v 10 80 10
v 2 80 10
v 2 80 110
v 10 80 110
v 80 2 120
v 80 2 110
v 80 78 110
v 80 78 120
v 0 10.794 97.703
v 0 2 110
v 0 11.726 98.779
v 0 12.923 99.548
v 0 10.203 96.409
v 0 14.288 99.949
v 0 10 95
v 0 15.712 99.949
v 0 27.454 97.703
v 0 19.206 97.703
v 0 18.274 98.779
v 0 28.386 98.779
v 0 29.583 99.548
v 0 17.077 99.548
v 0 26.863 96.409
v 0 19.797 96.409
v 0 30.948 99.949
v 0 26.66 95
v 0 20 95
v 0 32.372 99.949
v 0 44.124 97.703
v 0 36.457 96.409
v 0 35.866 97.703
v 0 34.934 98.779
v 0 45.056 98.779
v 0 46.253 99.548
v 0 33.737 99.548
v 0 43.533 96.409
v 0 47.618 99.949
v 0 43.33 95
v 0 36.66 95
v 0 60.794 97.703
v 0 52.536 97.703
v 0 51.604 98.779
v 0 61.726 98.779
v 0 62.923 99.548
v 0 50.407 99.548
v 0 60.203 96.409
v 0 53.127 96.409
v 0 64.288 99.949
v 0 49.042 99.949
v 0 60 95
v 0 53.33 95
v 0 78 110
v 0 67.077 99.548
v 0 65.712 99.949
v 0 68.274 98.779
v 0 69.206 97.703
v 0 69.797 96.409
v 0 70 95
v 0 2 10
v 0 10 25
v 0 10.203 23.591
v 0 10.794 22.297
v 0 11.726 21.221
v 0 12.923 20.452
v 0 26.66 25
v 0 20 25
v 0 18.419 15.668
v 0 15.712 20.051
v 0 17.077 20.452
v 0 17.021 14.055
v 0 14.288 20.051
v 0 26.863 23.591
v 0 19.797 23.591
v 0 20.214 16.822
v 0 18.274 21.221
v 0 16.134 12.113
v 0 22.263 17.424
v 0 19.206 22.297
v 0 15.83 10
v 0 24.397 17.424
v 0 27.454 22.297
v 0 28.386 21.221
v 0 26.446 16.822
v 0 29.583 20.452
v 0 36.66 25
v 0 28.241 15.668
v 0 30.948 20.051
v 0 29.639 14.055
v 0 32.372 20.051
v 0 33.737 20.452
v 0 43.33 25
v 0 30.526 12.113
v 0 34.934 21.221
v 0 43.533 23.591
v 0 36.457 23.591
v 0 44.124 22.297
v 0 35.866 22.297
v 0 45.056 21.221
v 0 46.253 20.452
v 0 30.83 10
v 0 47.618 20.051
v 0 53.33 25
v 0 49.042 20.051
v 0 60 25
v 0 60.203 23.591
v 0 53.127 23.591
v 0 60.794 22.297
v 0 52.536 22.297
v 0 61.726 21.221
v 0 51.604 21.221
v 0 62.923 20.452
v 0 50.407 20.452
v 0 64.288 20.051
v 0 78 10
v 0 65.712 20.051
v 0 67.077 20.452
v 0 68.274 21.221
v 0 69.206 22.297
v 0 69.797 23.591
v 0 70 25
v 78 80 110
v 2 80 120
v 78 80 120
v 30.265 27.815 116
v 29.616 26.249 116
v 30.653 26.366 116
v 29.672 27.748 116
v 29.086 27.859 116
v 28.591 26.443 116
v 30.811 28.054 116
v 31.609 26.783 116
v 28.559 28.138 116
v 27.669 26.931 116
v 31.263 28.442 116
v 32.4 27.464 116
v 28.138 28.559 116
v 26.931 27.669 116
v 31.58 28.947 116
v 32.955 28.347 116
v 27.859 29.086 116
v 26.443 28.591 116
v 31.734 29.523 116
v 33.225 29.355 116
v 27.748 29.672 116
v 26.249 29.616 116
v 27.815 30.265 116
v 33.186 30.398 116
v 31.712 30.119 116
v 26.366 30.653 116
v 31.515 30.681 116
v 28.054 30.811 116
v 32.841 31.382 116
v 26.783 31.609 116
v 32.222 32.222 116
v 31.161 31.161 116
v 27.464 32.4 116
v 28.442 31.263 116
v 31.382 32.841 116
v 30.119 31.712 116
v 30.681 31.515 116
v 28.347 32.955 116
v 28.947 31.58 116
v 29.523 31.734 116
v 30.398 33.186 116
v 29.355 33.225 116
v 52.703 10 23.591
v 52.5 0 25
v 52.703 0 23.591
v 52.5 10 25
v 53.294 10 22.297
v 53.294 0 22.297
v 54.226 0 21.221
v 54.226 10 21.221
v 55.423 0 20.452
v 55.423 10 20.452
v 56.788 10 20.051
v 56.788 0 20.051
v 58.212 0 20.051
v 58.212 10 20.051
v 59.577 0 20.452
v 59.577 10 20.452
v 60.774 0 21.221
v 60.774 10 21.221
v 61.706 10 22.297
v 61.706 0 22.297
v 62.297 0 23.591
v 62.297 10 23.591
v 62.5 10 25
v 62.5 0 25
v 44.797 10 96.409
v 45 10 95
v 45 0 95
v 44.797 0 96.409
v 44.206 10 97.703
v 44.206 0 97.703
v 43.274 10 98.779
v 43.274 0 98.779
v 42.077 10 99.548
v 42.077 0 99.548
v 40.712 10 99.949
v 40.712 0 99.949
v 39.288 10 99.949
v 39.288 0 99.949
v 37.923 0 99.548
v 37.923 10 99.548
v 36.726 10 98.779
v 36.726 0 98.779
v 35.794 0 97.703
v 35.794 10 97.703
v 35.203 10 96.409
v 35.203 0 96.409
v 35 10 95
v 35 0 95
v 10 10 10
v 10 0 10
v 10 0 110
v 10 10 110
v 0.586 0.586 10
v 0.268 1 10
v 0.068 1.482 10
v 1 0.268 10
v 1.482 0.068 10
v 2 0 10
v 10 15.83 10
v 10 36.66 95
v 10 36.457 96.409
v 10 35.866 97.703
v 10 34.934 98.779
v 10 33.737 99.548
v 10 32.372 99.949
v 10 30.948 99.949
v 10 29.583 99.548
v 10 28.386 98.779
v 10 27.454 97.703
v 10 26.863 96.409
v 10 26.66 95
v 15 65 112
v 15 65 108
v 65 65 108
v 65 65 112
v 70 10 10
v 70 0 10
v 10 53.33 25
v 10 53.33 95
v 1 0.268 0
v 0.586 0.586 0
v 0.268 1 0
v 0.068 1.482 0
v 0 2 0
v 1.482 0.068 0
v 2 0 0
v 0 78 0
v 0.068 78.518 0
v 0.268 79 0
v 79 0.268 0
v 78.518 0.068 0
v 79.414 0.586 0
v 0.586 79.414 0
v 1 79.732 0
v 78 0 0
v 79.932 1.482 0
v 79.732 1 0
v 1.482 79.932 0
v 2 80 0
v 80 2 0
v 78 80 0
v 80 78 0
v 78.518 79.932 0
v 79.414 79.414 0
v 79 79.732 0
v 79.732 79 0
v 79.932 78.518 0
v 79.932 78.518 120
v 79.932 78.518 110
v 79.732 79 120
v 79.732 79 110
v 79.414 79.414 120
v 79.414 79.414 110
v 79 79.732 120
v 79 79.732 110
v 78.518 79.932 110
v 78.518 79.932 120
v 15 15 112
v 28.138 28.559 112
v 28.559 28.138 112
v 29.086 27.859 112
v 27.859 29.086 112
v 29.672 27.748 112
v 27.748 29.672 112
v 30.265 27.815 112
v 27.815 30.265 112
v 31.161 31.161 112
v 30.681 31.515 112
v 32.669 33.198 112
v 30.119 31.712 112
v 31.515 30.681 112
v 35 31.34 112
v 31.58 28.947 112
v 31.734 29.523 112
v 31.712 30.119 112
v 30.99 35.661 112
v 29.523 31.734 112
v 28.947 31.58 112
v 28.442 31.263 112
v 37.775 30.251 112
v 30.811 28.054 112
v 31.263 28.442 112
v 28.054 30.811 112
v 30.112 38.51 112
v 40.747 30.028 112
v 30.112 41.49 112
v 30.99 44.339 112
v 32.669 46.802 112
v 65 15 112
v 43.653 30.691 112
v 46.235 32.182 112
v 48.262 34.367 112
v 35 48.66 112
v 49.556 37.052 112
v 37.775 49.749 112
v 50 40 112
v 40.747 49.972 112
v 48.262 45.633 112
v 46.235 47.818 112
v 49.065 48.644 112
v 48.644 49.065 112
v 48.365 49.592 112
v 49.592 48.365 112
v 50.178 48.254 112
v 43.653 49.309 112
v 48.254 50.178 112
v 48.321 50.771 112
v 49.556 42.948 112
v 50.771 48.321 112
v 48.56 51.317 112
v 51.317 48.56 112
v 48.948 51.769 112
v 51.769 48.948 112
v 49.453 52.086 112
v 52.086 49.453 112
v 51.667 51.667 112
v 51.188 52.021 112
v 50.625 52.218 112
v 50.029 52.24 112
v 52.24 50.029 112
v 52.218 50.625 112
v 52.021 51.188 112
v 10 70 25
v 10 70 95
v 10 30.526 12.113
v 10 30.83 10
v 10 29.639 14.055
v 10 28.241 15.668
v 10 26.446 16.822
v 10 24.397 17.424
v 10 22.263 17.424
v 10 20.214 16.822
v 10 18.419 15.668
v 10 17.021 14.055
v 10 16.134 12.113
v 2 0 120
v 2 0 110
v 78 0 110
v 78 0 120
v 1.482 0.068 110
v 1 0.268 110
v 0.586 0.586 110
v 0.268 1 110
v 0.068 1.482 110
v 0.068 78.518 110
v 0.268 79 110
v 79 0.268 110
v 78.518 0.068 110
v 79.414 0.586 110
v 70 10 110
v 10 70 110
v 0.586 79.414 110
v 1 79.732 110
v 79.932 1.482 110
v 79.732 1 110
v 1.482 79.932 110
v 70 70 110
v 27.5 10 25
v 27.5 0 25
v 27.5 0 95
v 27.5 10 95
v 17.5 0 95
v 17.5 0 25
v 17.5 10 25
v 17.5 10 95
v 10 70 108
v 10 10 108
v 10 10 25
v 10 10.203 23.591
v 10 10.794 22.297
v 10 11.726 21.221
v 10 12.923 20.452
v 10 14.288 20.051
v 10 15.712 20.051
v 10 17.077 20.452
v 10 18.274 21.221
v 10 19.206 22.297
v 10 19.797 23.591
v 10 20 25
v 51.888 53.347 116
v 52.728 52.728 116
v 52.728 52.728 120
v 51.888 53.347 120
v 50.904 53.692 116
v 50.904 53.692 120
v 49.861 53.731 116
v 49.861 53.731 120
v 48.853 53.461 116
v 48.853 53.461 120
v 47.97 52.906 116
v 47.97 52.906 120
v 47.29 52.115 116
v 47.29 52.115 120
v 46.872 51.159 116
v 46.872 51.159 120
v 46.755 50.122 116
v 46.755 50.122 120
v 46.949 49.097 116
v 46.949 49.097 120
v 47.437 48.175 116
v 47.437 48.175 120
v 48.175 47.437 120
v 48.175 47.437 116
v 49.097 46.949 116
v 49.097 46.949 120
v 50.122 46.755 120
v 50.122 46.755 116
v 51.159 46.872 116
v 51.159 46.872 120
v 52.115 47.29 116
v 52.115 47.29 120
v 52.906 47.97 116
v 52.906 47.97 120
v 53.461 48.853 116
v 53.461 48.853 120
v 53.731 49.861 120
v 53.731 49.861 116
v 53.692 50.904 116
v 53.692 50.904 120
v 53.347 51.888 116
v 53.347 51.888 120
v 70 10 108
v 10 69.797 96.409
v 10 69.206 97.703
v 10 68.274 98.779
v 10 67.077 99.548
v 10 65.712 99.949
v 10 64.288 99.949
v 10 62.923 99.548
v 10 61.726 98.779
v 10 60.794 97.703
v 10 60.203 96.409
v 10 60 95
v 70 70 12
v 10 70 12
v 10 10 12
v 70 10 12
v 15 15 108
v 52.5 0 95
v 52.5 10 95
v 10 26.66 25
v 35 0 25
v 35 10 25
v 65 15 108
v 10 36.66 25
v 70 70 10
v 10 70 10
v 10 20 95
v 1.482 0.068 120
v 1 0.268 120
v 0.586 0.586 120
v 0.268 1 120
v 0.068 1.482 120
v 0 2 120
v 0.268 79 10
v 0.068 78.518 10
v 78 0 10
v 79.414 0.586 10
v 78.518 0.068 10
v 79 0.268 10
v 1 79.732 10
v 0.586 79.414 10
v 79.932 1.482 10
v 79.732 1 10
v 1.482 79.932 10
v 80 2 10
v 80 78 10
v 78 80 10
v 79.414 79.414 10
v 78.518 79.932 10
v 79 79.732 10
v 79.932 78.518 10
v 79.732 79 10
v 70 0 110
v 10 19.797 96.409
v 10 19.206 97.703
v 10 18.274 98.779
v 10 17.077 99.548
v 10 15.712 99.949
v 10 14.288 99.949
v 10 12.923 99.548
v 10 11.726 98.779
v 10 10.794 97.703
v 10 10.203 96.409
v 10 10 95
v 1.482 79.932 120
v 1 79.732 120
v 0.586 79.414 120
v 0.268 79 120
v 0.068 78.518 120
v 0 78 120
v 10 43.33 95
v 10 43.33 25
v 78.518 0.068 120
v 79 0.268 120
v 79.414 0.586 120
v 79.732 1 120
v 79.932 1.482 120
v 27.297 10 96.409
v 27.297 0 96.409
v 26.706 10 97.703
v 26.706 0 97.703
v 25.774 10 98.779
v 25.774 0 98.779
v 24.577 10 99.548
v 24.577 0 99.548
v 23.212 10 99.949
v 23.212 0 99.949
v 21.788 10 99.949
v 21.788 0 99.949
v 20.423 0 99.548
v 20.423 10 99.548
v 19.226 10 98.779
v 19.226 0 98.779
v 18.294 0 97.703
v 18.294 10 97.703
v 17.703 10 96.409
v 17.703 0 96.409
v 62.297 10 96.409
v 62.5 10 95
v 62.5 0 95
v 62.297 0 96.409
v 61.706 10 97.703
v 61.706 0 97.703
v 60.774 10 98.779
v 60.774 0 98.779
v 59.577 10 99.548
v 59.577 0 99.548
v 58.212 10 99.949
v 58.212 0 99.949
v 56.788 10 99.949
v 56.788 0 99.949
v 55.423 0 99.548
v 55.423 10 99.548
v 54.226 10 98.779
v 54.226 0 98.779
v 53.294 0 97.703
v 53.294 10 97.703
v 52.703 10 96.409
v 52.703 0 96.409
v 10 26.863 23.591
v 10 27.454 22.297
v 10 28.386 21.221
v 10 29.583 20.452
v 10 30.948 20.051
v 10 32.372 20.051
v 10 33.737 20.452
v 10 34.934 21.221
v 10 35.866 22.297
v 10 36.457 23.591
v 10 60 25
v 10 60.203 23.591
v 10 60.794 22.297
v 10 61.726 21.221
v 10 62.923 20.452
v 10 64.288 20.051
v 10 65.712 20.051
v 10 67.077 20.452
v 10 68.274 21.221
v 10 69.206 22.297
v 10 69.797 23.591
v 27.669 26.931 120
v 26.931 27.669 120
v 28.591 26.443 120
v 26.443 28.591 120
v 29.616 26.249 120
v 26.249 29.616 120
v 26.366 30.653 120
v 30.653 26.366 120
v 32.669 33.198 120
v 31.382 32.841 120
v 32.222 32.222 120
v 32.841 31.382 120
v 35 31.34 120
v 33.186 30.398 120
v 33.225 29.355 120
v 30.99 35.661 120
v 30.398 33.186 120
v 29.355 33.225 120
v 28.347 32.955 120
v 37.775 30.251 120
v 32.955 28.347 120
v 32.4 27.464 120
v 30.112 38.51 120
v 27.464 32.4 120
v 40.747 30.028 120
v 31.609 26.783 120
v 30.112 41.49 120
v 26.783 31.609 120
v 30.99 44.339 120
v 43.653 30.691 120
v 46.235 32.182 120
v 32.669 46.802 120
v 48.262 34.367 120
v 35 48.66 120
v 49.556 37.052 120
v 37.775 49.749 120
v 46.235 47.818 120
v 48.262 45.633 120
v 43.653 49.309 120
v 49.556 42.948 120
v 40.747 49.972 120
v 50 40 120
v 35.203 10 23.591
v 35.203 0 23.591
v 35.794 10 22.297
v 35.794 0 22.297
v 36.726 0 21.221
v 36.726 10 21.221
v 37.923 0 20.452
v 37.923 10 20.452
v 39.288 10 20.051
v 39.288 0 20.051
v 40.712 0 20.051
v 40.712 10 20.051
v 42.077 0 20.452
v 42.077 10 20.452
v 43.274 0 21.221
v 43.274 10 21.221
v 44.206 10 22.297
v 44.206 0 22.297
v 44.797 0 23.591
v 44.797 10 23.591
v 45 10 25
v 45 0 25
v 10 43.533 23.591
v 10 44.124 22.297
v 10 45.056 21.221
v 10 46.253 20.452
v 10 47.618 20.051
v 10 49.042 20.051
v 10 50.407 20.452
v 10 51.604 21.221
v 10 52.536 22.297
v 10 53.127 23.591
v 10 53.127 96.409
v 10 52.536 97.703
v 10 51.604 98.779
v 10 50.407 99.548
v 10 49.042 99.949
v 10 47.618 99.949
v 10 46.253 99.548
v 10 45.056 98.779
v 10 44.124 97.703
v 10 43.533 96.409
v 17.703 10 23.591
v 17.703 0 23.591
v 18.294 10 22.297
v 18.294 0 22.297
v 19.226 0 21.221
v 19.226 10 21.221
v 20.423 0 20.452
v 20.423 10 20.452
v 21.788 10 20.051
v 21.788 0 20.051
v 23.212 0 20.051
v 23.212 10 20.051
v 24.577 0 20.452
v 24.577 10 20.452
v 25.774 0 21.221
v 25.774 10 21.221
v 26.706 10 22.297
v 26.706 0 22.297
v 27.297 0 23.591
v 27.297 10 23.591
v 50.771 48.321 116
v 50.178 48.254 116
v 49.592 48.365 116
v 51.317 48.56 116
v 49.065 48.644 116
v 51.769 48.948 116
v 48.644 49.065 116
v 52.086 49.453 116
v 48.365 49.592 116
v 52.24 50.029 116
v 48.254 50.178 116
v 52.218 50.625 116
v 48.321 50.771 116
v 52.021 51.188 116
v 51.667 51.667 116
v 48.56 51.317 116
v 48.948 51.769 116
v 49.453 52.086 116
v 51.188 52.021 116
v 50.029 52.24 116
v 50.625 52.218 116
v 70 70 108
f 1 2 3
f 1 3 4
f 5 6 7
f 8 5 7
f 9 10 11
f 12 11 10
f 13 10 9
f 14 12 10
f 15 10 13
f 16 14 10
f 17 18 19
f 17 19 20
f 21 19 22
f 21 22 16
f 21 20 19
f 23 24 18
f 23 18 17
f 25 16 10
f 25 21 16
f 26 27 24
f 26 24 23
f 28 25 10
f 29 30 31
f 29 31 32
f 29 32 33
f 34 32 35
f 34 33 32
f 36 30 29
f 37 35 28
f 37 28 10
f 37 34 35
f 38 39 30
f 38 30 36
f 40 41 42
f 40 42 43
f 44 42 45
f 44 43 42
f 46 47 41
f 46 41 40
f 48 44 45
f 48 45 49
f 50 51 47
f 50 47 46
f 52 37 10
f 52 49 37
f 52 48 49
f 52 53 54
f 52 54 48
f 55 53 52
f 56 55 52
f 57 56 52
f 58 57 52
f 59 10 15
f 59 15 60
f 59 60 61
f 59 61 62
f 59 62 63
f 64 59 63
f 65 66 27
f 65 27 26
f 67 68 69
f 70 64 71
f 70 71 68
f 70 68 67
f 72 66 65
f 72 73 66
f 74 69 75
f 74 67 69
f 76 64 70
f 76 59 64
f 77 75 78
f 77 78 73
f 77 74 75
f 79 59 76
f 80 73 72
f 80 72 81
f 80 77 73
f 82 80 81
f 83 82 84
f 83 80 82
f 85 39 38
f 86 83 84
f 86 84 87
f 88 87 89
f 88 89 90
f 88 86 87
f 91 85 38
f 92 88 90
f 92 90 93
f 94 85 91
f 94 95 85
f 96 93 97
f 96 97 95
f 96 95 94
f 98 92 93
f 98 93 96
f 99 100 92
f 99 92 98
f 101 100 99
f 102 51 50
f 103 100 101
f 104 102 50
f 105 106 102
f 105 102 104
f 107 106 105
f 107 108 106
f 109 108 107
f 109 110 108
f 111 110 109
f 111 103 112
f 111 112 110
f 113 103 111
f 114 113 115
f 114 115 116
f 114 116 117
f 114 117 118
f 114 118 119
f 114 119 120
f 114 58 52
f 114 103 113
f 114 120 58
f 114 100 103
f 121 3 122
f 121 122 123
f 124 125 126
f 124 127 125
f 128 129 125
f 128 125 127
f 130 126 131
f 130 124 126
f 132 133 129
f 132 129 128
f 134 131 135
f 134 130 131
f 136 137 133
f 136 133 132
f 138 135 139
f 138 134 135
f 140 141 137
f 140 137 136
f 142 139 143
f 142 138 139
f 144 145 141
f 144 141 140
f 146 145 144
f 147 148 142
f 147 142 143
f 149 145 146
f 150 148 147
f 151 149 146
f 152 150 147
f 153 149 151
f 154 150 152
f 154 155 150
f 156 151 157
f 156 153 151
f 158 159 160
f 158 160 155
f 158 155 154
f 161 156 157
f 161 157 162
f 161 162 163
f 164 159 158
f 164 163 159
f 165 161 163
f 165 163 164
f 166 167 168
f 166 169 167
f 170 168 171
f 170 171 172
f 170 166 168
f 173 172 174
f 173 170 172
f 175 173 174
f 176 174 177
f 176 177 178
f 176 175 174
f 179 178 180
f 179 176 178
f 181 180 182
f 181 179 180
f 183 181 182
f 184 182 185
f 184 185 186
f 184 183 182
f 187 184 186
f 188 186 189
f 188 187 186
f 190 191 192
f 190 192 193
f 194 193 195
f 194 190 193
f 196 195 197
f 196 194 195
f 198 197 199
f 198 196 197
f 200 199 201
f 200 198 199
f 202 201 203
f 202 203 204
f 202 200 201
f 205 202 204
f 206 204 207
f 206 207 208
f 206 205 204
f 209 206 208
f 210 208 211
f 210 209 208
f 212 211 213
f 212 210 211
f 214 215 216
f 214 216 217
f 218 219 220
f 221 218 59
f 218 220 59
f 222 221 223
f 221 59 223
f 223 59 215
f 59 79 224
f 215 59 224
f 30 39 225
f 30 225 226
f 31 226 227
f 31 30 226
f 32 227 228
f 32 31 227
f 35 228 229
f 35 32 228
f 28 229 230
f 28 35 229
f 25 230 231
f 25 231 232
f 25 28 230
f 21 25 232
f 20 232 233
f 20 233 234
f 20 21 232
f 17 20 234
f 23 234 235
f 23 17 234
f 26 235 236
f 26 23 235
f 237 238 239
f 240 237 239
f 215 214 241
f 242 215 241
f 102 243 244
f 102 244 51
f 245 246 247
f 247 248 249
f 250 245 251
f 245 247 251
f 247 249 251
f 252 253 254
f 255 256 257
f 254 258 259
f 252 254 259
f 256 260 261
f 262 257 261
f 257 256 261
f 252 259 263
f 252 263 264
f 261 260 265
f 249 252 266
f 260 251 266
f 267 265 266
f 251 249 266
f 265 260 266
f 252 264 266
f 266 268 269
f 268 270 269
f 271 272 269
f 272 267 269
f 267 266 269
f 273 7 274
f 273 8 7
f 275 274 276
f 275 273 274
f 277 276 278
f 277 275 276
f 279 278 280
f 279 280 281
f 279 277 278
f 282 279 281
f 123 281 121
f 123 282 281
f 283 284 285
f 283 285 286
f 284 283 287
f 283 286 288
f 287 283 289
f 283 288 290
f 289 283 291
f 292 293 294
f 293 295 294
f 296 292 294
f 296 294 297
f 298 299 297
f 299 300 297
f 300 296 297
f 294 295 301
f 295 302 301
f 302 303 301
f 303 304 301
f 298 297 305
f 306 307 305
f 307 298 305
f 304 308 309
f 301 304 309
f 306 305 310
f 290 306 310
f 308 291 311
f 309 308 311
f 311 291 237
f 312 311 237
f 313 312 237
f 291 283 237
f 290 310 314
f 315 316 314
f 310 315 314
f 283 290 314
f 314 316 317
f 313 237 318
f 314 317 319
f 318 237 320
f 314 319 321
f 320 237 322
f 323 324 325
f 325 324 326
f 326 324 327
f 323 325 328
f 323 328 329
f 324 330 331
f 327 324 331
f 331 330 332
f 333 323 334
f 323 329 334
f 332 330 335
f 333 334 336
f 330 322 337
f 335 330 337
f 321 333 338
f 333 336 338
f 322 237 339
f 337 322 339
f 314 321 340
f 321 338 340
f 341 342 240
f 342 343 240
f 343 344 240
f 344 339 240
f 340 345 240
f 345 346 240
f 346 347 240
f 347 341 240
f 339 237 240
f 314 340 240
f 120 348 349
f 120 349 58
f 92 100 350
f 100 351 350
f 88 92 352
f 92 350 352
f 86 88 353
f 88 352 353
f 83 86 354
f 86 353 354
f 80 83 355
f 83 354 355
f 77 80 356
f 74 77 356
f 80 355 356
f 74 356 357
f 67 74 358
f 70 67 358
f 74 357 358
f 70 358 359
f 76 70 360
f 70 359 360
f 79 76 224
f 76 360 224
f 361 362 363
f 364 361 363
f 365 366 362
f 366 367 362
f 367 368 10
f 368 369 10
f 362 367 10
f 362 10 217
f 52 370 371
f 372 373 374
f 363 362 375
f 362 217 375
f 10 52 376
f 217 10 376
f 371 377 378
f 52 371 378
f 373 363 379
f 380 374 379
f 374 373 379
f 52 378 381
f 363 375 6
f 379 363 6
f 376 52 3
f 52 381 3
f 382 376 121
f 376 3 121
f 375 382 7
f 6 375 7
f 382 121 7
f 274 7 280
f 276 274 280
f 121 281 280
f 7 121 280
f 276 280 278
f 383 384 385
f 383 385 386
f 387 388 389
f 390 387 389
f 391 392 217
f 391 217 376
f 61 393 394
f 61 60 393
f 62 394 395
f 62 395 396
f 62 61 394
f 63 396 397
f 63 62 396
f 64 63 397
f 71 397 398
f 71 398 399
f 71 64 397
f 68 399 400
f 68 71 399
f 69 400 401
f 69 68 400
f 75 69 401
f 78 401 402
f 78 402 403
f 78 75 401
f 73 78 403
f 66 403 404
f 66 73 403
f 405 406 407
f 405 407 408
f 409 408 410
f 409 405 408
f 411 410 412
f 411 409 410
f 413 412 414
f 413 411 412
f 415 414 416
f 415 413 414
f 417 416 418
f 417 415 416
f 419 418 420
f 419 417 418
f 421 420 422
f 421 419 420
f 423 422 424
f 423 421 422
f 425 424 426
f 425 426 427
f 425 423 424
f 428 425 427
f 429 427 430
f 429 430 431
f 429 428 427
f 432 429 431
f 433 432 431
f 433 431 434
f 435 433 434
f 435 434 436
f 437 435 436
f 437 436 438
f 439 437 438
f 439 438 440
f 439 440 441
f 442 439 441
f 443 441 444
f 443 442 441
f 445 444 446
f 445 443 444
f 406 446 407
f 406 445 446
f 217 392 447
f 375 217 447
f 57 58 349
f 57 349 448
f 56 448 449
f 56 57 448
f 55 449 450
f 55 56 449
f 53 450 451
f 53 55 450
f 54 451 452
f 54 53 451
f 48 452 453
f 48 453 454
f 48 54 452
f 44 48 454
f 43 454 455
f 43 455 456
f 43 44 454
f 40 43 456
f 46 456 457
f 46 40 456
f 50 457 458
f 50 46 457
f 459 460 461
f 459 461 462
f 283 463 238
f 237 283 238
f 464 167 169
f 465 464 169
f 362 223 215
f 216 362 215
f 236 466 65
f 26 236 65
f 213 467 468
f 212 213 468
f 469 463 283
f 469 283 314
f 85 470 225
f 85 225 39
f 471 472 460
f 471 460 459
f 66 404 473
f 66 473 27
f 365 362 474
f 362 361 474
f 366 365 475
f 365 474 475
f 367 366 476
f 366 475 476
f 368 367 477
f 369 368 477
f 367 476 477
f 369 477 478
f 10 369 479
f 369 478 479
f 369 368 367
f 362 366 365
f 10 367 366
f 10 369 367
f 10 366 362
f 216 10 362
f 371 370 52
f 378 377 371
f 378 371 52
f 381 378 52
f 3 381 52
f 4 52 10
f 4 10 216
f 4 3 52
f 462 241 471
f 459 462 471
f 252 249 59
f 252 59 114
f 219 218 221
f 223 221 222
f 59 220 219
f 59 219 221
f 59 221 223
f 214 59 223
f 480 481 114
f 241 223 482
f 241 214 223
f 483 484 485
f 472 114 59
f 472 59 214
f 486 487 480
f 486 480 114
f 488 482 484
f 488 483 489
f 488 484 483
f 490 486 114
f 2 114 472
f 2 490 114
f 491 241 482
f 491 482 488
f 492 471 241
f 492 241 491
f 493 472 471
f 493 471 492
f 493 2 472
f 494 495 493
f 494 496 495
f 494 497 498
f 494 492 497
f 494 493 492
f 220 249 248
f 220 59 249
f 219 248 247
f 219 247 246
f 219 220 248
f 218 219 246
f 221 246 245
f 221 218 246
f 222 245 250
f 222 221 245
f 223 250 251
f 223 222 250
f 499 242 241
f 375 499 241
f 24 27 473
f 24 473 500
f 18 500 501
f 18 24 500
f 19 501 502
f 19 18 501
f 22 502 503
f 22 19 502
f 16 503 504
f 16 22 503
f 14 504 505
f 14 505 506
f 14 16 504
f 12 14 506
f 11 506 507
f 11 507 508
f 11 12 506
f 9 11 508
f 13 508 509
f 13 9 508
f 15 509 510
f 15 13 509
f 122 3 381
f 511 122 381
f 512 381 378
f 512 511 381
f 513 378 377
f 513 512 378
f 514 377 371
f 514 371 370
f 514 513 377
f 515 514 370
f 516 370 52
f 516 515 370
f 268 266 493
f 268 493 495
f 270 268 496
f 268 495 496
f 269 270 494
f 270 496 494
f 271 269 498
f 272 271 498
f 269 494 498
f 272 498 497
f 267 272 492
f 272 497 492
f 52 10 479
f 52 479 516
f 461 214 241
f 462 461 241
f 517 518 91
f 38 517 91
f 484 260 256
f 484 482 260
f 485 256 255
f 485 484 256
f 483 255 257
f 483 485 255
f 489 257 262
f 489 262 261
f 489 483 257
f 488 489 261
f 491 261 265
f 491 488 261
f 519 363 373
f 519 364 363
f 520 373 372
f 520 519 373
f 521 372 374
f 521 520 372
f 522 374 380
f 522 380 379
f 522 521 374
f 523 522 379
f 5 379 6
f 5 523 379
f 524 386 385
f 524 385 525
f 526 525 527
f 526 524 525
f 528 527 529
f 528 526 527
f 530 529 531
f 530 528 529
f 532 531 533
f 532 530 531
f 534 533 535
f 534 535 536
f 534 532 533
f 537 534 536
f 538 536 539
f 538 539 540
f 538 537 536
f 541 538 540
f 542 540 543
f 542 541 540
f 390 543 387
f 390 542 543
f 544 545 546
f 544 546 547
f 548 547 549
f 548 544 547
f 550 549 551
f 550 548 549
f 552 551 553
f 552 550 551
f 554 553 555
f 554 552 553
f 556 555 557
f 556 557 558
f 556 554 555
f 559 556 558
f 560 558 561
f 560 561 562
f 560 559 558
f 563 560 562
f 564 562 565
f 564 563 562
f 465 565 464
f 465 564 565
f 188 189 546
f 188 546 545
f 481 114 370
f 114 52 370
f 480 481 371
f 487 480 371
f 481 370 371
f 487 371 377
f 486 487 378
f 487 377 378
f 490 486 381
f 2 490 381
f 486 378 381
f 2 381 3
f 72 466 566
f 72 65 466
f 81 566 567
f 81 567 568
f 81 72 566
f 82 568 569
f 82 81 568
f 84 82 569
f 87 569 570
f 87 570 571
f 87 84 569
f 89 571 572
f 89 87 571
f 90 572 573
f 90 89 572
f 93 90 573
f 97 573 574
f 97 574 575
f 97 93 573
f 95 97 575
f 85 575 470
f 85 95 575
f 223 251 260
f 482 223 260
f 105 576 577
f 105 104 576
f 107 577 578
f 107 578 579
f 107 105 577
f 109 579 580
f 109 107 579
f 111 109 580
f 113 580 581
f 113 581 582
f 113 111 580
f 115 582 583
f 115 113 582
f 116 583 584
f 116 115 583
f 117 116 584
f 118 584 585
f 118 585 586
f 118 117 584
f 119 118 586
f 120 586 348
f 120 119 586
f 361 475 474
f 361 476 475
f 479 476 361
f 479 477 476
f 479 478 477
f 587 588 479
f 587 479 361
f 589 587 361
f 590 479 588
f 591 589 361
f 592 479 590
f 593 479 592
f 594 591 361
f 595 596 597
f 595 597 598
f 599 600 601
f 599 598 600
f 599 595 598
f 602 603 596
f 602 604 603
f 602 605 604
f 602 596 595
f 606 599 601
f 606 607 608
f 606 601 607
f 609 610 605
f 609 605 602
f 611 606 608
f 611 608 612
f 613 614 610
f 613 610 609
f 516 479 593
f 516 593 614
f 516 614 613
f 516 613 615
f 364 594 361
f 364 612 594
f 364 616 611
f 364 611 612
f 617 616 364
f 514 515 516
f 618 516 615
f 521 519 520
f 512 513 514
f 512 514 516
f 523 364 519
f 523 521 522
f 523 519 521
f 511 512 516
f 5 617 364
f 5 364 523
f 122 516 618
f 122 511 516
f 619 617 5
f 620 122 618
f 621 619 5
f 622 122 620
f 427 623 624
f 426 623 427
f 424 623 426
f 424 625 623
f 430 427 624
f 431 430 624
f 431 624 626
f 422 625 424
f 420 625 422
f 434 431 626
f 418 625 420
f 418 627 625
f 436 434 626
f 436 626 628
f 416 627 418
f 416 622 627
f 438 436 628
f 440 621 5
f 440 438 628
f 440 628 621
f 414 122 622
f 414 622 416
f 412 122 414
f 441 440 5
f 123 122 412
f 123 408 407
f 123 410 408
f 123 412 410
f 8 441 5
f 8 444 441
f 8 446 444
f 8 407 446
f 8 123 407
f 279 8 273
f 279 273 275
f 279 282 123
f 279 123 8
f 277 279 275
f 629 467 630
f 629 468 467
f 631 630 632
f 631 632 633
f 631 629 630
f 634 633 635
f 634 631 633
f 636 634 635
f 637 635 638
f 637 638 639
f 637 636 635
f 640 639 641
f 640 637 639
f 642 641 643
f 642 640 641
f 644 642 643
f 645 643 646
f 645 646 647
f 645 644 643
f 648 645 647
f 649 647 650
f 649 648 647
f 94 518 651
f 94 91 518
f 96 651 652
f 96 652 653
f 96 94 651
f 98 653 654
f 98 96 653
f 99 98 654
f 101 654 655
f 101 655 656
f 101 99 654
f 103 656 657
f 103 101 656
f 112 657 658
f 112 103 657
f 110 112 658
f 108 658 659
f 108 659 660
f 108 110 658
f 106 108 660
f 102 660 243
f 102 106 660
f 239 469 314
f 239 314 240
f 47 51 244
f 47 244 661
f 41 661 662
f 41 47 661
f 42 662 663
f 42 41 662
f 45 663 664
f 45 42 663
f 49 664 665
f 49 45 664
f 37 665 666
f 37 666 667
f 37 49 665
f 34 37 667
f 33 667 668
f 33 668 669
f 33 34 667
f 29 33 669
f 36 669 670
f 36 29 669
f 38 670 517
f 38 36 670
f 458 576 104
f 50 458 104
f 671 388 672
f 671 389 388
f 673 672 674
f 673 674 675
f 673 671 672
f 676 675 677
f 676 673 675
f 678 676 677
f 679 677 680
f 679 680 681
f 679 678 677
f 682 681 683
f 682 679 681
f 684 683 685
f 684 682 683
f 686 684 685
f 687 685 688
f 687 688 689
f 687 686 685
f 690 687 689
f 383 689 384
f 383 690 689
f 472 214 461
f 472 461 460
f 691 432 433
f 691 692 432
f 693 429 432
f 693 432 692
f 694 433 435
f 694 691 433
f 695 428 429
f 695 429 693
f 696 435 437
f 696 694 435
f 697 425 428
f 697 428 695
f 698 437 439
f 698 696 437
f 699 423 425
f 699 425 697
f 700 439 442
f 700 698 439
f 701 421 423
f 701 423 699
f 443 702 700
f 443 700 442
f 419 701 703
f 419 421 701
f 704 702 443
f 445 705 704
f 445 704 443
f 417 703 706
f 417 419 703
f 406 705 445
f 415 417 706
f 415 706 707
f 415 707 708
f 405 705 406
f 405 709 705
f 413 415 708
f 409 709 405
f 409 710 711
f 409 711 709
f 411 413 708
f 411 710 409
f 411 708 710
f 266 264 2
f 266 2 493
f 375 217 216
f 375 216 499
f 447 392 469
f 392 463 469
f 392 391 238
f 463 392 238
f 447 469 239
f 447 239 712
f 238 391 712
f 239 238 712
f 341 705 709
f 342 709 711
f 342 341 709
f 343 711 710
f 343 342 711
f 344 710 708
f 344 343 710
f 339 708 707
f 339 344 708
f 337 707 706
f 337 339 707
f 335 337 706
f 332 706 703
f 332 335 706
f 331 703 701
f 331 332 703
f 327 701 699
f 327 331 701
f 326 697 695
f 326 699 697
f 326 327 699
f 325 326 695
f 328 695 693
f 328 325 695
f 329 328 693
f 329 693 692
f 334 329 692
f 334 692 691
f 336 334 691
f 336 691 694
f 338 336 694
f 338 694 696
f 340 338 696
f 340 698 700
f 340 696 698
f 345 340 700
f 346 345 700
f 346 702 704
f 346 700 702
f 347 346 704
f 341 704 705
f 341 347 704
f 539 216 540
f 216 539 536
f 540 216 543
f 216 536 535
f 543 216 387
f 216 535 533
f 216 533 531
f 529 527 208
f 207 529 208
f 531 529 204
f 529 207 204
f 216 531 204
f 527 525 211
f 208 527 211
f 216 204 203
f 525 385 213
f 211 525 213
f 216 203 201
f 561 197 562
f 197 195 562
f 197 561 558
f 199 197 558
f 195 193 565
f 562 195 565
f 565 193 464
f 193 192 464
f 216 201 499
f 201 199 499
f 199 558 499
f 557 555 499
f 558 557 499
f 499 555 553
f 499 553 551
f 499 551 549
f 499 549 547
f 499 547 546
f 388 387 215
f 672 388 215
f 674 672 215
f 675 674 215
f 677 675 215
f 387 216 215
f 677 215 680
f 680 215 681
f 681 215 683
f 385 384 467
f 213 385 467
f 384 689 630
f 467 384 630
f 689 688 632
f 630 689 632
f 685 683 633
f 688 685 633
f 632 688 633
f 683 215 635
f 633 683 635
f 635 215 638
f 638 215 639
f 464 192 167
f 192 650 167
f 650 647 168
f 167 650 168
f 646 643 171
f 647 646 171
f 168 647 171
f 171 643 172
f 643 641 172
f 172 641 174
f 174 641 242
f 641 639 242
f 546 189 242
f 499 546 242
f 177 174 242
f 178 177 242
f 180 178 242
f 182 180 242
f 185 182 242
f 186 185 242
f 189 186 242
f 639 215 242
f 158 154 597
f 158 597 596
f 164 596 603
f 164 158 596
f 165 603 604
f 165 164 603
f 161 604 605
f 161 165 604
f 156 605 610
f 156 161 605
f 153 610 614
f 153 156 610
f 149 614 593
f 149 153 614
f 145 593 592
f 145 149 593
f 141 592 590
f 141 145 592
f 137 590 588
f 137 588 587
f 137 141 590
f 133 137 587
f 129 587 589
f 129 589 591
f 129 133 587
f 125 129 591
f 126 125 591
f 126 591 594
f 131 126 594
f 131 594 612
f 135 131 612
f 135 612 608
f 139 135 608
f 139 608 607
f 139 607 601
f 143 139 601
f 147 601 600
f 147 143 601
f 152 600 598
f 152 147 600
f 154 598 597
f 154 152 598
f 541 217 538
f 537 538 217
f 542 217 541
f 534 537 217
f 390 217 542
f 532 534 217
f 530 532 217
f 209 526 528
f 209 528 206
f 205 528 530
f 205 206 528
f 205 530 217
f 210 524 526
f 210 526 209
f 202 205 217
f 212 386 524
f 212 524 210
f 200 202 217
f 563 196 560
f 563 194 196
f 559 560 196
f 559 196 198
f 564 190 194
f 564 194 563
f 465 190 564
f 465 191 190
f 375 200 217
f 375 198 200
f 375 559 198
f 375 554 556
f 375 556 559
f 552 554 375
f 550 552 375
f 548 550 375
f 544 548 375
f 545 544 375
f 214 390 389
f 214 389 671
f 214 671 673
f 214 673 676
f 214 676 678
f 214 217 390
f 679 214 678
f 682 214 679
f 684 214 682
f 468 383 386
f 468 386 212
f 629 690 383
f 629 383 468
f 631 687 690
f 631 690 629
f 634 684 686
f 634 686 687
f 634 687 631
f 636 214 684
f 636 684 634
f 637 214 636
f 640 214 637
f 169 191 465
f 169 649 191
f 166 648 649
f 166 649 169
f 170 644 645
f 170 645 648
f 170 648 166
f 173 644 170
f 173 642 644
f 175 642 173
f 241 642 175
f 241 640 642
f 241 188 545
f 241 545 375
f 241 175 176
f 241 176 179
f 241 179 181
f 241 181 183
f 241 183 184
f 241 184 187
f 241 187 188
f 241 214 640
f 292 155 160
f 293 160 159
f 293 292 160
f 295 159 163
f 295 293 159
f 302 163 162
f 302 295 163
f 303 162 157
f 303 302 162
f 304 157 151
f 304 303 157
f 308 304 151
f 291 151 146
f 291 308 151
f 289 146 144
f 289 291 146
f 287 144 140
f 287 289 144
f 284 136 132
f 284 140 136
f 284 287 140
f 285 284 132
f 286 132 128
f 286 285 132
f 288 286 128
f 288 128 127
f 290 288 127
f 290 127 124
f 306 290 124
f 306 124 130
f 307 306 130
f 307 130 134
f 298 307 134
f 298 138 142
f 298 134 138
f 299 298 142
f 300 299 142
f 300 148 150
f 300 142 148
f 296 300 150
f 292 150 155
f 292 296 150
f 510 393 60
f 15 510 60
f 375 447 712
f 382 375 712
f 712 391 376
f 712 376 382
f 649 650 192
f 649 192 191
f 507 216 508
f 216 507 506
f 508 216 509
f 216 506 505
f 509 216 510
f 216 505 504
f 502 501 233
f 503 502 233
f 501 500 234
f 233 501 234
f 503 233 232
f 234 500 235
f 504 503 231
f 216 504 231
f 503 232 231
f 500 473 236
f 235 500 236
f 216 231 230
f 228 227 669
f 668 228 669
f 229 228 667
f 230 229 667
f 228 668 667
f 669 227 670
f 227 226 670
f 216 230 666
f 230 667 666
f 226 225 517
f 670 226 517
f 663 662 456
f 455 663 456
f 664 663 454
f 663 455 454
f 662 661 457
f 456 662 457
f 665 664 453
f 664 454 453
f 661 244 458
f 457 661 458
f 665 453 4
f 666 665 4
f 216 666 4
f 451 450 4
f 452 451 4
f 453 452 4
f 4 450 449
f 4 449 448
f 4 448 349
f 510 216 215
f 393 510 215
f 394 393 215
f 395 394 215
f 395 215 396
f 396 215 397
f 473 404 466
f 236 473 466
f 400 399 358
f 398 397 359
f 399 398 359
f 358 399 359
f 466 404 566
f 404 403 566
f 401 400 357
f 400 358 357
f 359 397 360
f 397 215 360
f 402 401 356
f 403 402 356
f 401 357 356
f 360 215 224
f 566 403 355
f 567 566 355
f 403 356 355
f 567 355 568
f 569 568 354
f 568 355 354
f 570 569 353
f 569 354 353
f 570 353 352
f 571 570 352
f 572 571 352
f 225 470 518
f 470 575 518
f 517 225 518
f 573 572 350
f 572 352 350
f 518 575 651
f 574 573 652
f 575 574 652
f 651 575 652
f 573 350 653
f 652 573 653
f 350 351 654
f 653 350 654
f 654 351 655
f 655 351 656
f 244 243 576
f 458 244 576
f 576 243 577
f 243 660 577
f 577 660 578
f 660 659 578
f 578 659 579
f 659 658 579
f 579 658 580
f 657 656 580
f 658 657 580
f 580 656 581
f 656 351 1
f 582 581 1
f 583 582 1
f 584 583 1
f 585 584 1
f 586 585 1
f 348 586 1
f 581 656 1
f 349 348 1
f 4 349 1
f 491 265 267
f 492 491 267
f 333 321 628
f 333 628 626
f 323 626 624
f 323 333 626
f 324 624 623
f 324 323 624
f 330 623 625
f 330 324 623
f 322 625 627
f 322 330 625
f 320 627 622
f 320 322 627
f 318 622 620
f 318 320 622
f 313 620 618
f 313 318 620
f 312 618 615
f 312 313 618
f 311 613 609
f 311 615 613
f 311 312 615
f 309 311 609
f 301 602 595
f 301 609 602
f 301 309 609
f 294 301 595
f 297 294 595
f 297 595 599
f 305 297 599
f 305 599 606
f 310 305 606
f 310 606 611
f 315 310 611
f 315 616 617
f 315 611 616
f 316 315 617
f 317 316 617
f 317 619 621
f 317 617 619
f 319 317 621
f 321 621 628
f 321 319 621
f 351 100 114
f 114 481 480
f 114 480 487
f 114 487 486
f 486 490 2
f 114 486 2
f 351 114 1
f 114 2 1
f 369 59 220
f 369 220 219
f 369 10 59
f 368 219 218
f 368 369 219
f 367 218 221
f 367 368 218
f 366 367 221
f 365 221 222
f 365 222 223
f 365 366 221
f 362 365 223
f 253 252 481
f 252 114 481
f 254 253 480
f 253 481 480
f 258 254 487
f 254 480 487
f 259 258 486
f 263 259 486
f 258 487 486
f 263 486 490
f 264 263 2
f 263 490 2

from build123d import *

# Parameters (mm, degrees)
BOX004_W                  = 60
BOX004_H                  = 60
BOX004_DEPTH              = 2
BOX_W                     = 80
BOX_H                     = 80
BOX_DEPTH                 = 10
FILLET005_R               = 2
CYLINDER002_R             = 5
CYLINDER002_DEPTH         = 10
CYLINDER003_R             = 5
CYLINDER003_DEPTH         = 10
BOX008_W                  = 10
BOX008_H                  = 10
BOX008_DEPTH              = 70
CYLINDER004_R             = 5
CYLINDER004_DEPTH         = 10
CYLINDER005_R             = 5
CYLINDER005_DEPTH         = 10
BOX009_W                  = 10
BOX009_H                  = 10
BOX009_DEPTH              = 70
CYLINDER_R                = 5
CYLINDER_DEPTH            = 10
CYLINDER001_R             = 5
CYLINDER001_DEPTH         = 10
BOX007_W                  = 10
BOX007_H                  = 10
BOX007_DEPTH              = 70
BOX001_W                  = 60
BOX001_H                  = 10
BOX001_DEPTH              = 100
CYLINDER014_W             = 7.5
CYLINDER014_H             = 10
CYLINDER014_ANGLE         = 180
CYLINDER007_R             = 5
CYLINDER007_DEPTH         = 10
CYLINDER006_R             = 5
CYLINDER006_DEPTH         = 10
BOX010_W                  = 10
BOX010_H                  = 10
BOX010_DEPTH              = 70
FUSION003_PLACEMENT_ANGLE = 90
CYLINDER008_R             = 5
CYLINDER008_DEPTH         = 10
CYLINDER009_R             = 5
CYLINDER009_DEPTH         = 10
BOX011_W                  = 10
BOX011_H                  = 10
BOX011_DEPTH              = 70
FUSION004_PLACEMENT_ANGLE = 90
CYLINDER010_R             = 5
CYLINDER010_DEPTH         = 10
CYLINDER011_R             = 5
CYLINDER011_DEPTH         = 10
BOX012_W                  = 10
BOX012_H                  = 10
BOX012_DEPTH              = 70
FUSION005_PLACEMENT_ANGLE = 90
CYLINDER012_R             = 5
CYLINDER012_DEPTH         = 10
CYLINDER013_R             = 5
CYLINDER013_DEPTH         = 10
BOX013_W                  = 10
BOX013_H                  = 10
BOX013_DEPTH              = 70
FUSION006_PLACEMENT_ANGLE = 90
BOX002_W                  = 10
BOX002_H                  = 80
BOX002_DEPTH              = 100
FILLET001_R               = 2
FILLET011_R               = 2
CYLINDER033_R             = 10
CYLINDER033_DEPTH         = 20
CYLINDER031_R             = 3.5
CYLINDER031_DEPTH         = 4
CYLINDER032_R             = 2
CYLINDER032_DEPTH         = 20
CYLINDER030_R             = 3.5
CYLINDER030_DEPTH         = 4
CYLINDER029_R             = 2
CYLINDER029_DEPTH         = 20
FUSION014_PLACEMENT_ANGLE = 45
BOX020_W                  = 60
BOX020_H                  = 60
BOX020_DEPTH              = 8
BOX019_W                  = 50
BOX019_H                  = 50
BOX019_DEPTH              = 4
CYLINDER028_R             = 10
CYLINDER028_DEPTH         = 30
CYLINDER027_R             = 2
CYLINDER027_DEPTH         = 30
CYLINDER026_R             = 2
CYLINDER026_DEPTH         = 30
CYLINDER025_R             = 3.5
CYLINDER025_DEPTH         = 4
BOX005_W                  = 60
BOX005_H                  = 60
BOX005_DEPTH              = 2
CYLINDER023_R             = 3.5
CYLINDER023_DEPTH         = 4
CYLINDER024_R             = 2
CYLINDER024_DEPTH         = 20
CYLINDER022_R             = 2
CYLINDER022_DEPTH         = 20
CYLINDER021_R             = 10
CYLINDER021_DEPTH         = 15
BOX018_W                  = 60
BOX018_H                  = 60
BOX018_DEPTH              = 2
BOX017_W                  = 80
BOX017_H                  = 80
BOX017_DEPTH              = 10
FILLET006_R               = 2
FILLET007_R               = 2
FILLET008_R               = 2
FILLET009_R               = 2


with BuildPart() as cubo004:
    # Box004 → Box004 (new body)
    with BuildSketch(Plane(origin=(10, 10, 10), x_dir=(1, 0, 0), z_dir=(0, 0, 1))):
        with Locations((30, 30)):
            Rectangle(BOX004_W, BOX004_H)
    extrude(amount=BOX004_DEPTH)


with BuildPart() as fillet005:
    # Box → Box (new body)
    with BuildSketch(Plane.XY):
        with Locations((40, 40)):
            Rectangle(BOX_W, BOX_H)
    extrude(amount=BOX_DEPTH)

    # Fusion008: union Cubo004
    add(cubo004.part)

    # Fillet005
    fillet005_edges = [fillet005.edges().sort_by_distance(p)[0] for p in [
        (0, 0, 5),
        (0, 80, 5),
        (80, 0, 5),
        (80, 80, 5),
    ]]
    fillet(fillet005_edges, radius=FILLET005_R)


with BuildPart() as cilindro002:
    # Cylinder002 → Cylinder002 (new body)
    with BuildSketch(Plane(origin=(15, 10, 25), x_dir=(1, 0, 0), z_dir=(0, -1, 0))):
        Circle(CYLINDER002_R)
    extrude(amount=CYLINDER002_DEPTH)


with BuildPart() as cilindro003:
    # Cylinder003 → Cylinder003 (new body)
    with BuildSketch(Plane(origin=(15, 10, 95), x_dir=(1, 0, 0), z_dir=(0, -1, 0))):
        Circle(CYLINDER003_R)
    extrude(amount=CYLINDER003_DEPTH)


with BuildPart() as fusion001:
    # Box008 → Box008 (new body)
    with BuildSketch(Plane(origin=(10, 0, 25), x_dir=(1, 0, 0), z_dir=(0, 0, 1))):
        with Locations((5, 5)):
            Rectangle(BOX008_W, BOX008_H)
    extrude(amount=BOX008_DEPTH)

    # Fusion001: union Cilindro002, Cilindro003
    add(cilindro002.part)
    add(cilindro003.part)


with BuildPart() as fusion001_1:
    # Fusion001 placement: moved
    add(fusion001.part.moved(Location((25, 0, 0))))


with BuildPart() as cilindro004:
    # Cylinder004 → Cylinder004 (new body)
    with BuildSketch(Plane(origin=(15, 10, 25), x_dir=(1, 0, 0), z_dir=(0, -1, 0))):
        Circle(CYLINDER004_R)
    extrude(amount=CYLINDER004_DEPTH)


with BuildPart() as cilindro005:
    # Cylinder005 → Cylinder005 (new body)
    with BuildSketch(Plane(origin=(15, 10, 95), x_dir=(1, 0, 0), z_dir=(0, -1, 0))):
        Circle(CYLINDER005_R)
    extrude(amount=CYLINDER005_DEPTH)


with BuildPart() as fusion002:
    # Box009 → Box009 (new body)
    with BuildSketch(Plane(origin=(10, 0, 25), x_dir=(1, 0, 0), z_dir=(0, 0, 1))):
        with Locations((5, 5)):
            Rectangle(BOX009_W, BOX009_H)
    extrude(amount=BOX009_DEPTH)

    # Fusion002: union Cilindro004, Cilindro005
    add(cilindro004.part)
    add(cilindro005.part)


with BuildPart() as fusion002_1:
    # Fusion002 placement: moved
    add(fusion002.part.moved(Location((42.5, 0, 0))))


with BuildPart() as cilindro:
    # Cylinder → Cylinder (new body)
    with BuildSketch(Plane(origin=(15, 10, 25), x_dir=(1, 0, 0), z_dir=(0, -1, 0))):
        Circle(CYLINDER_R)
    extrude(amount=CYLINDER_DEPTH)


with BuildPart() as cilindro001:
    # Cylinder001 → Cylinder001 (new body)
    with BuildSketch(Plane(origin=(15, 10, 95), x_dir=(1, 0, 0), z_dir=(0, -1, 0))):
        Circle(CYLINDER001_R)
    extrude(amount=CYLINDER001_DEPTH)


with BuildPart() as fusion:
    # Box007 → Box007 (new body)
    with BuildSketch(Plane(origin=(10, 0, 25), x_dir=(1, 0, 0), z_dir=(0, 0, 1))):
        with Locations((5, 5)):
            Rectangle(BOX007_W, BOX007_H)
    extrude(amount=BOX007_DEPTH)

    # Fusion: union Cilindro, Cilindro001
    add(cilindro.part)
    add(cilindro001.part)


with BuildPart() as fusion_1:
    # Fusion placement: moved
    add(fusion.part.moved(Location((7.5, 0, 0))))


with BuildPart() as cut019:
    # Box001 → Box001 (new body)
    with BuildSketch(Plane(origin=(10, 0, 10), x_dir=(1, 0, 0), z_dir=(0, 0, 1))):
        with Locations((30, 5)):
            Rectangle(BOX001_W, BOX001_H)
    extrude(amount=BOX001_DEPTH)

    # Cut001: cut Fusion
    add(fusion_1.part, mode=Mode.SUBTRACT)

    # Cut018: cut Fusion002
    add(fusion002_1.part, mode=Mode.SUBTRACT)

    # Cut019: cut Fusion001
    add(fusion001_1.part, mode=Mode.SUBTRACT)


with BuildPart() as cilindro014:
    # Cylinder014 → Cylinder014 (revolve)
    with BuildSketch(Plane(origin=(0, 23.33, 10), x_dir=(0, 1, 0), z_dir=(0, 0, -1))):
        with Locations((3.75, 5)):
            Rectangle(CYLINDER014_W, CYLINDER014_H)
    revolve(axis=Axis((0, 23.33, 10), (1, 0, 0)), revolution_arc=CYLINDER014_ANGLE)


with BuildPart() as cilindro007:
    # Cylinder007 → Cylinder007 (new body)
    with BuildSketch(Plane(origin=(15, 10, 25), x_dir=(1, 0, 0), z_dir=(0, -1, 0))):
        Circle(CYLINDER007_R)
    extrude(amount=CYLINDER007_DEPTH)


with BuildPart() as cilindro006:
    # Cylinder006 → Cylinder006 (new body)
    with BuildSketch(Plane(origin=(15, 10, 95), x_dir=(1, 0, 0), z_dir=(0, -1, 0))):
        Circle(CYLINDER006_R)
    extrude(amount=CYLINDER006_DEPTH)


with BuildPart() as fusion003:
    # Box010 → Box010 (new body)
    with BuildSketch(Plane(origin=(10, 0, 25), x_dir=(1, 0, 0), z_dir=(0, 0, 1))):
        with Locations((5, 5)):
            Rectangle(BOX010_W, BOX010_H)
    extrude(amount=BOX010_DEPTH)

    # Fusion003: union Cilindro007, Cilindro006
    add(cilindro007.part)
    add(cilindro006.part)


with BuildPart() as fusion003_1:
    # Fusion003 placement: moved
    add(fusion003.part.moved(Location((10, 0, 0))).rotate(Axis((10, 0, 0), (0, 0, 1)), FUSION003_PLACEMENT_ANGLE))


with BuildPart() as cilindro008:
    # Cylinder008 → Cylinder008 (new body)
    with BuildSketch(Plane(origin=(15, 10, 25), x_dir=(1, 0, 0), z_dir=(0, -1, 0))):
        Circle(CYLINDER008_R)
    extrude(amount=CYLINDER008_DEPTH)


with BuildPart() as cilindro009:
    # Cylinder009 → Cylinder009 (new body)
    with BuildSketch(Plane(origin=(15, 10, 95), x_dir=(1, 0, 0), z_dir=(0, -1, 0))):
        Circle(CYLINDER009_R)
    extrude(amount=CYLINDER009_DEPTH)


with BuildPart() as fusion004:
    # Box011 → Box011 (new body)
    with BuildSketch(Plane(origin=(10, 0, 25), x_dir=(1, 0, 0), z_dir=(0, 0, 1))):
        with Locations((5, 5)):
            Rectangle(BOX011_W, BOX011_H)
    extrude(amount=BOX011_DEPTH)

    # Fusion004: union Cilindro008, Cilindro009
    add(cilindro008.part)
    add(cilindro009.part)


with BuildPart() as fusion004_1:
    # Fusion004 placement: moved
    add(fusion004.part.moved(Location((10, 16.66, 0))).rotate(Axis((10, 16.66, 0), (0, 0, 1)), FUSION004_PLACEMENT_ANGLE))


with BuildPart() as cilindro010:
    # Cylinder010 → Cylinder010 (new body)
    with BuildSketch(Plane(origin=(15, 10, 25), x_dir=(1, 0, 0), z_dir=(0, -1, 0))):
        Circle(CYLINDER010_R)
    extrude(amount=CYLINDER010_DEPTH)


with BuildPart() as cilindro011:
    # Cylinder011 → Cylinder011 (new body)
    with BuildSketch(Plane(origin=(15, 10, 95), x_dir=(1, 0, 0), z_dir=(0, -1, 0))):
        Circle(CYLINDER011_R)
    extrude(amount=CYLINDER011_DEPTH)


with BuildPart() as fusion005:
    # Box012 → Box012 (new body)
    with BuildSketch(Plane(origin=(10, 0, 25), x_dir=(1, 0, 0), z_dir=(0, 0, 1))):
        with Locations((5, 5)):
            Rectangle(BOX012_W, BOX012_H)
    extrude(amount=BOX012_DEPTH)

    # Fusion005: union Cilindro010, Cilindro011
    add(cilindro010.part)
    add(cilindro011.part)


with BuildPart() as fusion005_1:
    # Fusion005 placement: moved
    add(fusion005.part.moved(Location((10, 33.33, 0))).rotate(Axis((10, 33.33, 0), (0, 0, 1)), FUSION005_PLACEMENT_ANGLE))


with BuildPart() as cilindro012:
    # Cylinder012 → Cylinder012 (new body)
    with BuildSketch(Plane(origin=(15, 10, 25), x_dir=(1, 0, 0), z_dir=(0, -1, 0))):
        Circle(CYLINDER012_R)
    extrude(amount=CYLINDER012_DEPTH)


with BuildPart() as cilindro013:
    # Cylinder013 → Cylinder013 (new body)
    with BuildSketch(Plane(origin=(15, 10, 95), x_dir=(1, 0, 0), z_dir=(0, -1, 0))):
        Circle(CYLINDER013_R)
    extrude(amount=CYLINDER013_DEPTH)


with BuildPart() as fusion006:
    # Box013 → Box013 (new body)
    with BuildSketch(Plane(origin=(10, 0, 25), x_dir=(1, 0, 0), z_dir=(0, 0, 1))):
        with Locations((5, 5)):
            Rectangle(BOX013_W, BOX013_H)
    extrude(amount=BOX013_DEPTH)

    # Fusion006: union Cilindro012, Cilindro013
    add(cilindro012.part)
    add(cilindro013.part)


with BuildPart() as fusion006_1:
    # Fusion006 placement: moved
    add(fusion006.part.moved(Location((10, 50, 0))).rotate(Axis((10, 50, 0), (0, 0, 1)), FUSION006_PLACEMENT_ANGLE))


with BuildPart() as fillet011:
    # Box002 → Box002 (new body)
    with BuildSketch(Plane.XY.offset(10)):
        with Locations((5, 40)):
            Rectangle(BOX002_W, BOX002_H)
    extrude(amount=BOX002_DEPTH)

    # Cut: cut Fusion006
    add(fusion006_1.part, mode=Mode.SUBTRACT)

    # Cut004: cut Fusion005
    add(fusion005_1.part, mode=Mode.SUBTRACT)

    # Cut005: cut Fusion004
    add(fusion004_1.part, mode=Mode.SUBTRACT)

    # Cut006: cut Fusion003
    add(fusion003_1.part, mode=Mode.SUBTRACT)

    # Cut007: cut Cilindro014
    add(cilindro014.part, mode=Mode.SUBTRACT)

    # Fillet001
    fillet001_edges = [fillet011.edges().sort_by_distance(p)[0] for p in [
        (0, 0, 60),
    ]]
    fillet(fillet001_edges, radius=FILLET001_R)

    # Fillet011
    fillet011_edges = [fillet011.edges().sort_by_distance(p)[0] for p in [
        (0, 80, 60),
    ]]
    fillet(fillet011_edges, radius=FILLET011_R)


with BuildPart() as cilindro033:
    # Cylinder033 → Cylinder033 (new body)
    with BuildSketch(Plane(origin=(40, 40, 105), x_dir=(1, 0, 0), z_dir=(0, 0, 1))):
        Circle(CYLINDER033_R)
    extrude(amount=CYLINDER033_DEPTH)


with BuildPart() as cilindro031:
    # Cylinder031 → Cylinder031 (new body)
    with BuildSketch(Plane(origin=(54.5, 40, 116), x_dir=(1, 0, 0), z_dir=(0, 0, 1))):
        Circle(CYLINDER031_R)
    extrude(amount=CYLINDER031_DEPTH)


with BuildPart() as fusion013:
    # Cylinder032 → Cylinder032 (new body)
    with BuildSketch(Plane(origin=(54.5, 40, 112), x_dir=(1, 0, 0), z_dir=(0, 0, 1))):
        Circle(CYLINDER032_R)
    extrude(amount=CYLINDER032_DEPTH)

    # Fusion013: union Cilindro031
    add(cilindro031.part)


with BuildPart() as fusion013_1:
    # Fusion013 placement: moved
    add(fusion013.part.moved(Location((-29, 0, 0))))


with BuildPart() as cilindro030:
    # Cylinder030 → Cylinder030 (new body)
    with BuildSketch(Plane(origin=(54.5, 40, 116), x_dir=(1, 0, 0), z_dir=(0, 0, 1))):
        Circle(CYLINDER030_R)
    extrude(amount=CYLINDER030_DEPTH)


with BuildPart() as fusion014:
    # Cylinder029 → Cylinder029 (new body)
    with BuildSketch(Plane(origin=(54.5, 40, 112), x_dir=(1, 0, 0), z_dir=(0, 0, 1))):
        Circle(CYLINDER029_R)
    extrude(amount=CYLINDER029_DEPTH)

    # Fusion012: union Cilindro030
    add(cilindro030.part)

    # Fusion014: union Fusion013
    add(fusion013_1.part)


with BuildPart() as fusion014_1:
    # Fusion014 placement: moved
    add(fusion014.part.moved(Location((40, -16.568542, 0))).rotate(Axis((40, -16.568542, 0), (0, 0, 1)), FUSION014_PLACEMENT_ANGLE))


with BuildPart() as cubo020:
    # Box020 → Box020 (new body)
    with BuildSketch(Plane(origin=(10, 10, 112), x_dir=(1, 0, 0), z_dir=(0, 0, 1))):
        with Locations((30, 30)):
            Rectangle(BOX020_W, BOX020_H)
    extrude(amount=BOX020_DEPTH)


with BuildPart() as cubo019:
    # Box019 → Box019 (new body)
    with BuildSketch(Plane(origin=(15, 15, 108), x_dir=(1, 0, 0), z_dir=(0, 0, 1))):
        with Locations((25, 25)):
            Rectangle(BOX019_W, BOX019_H)
    extrude(amount=BOX019_DEPTH)


with BuildPart() as cilindro028:
    # Cylinder028 → Cylinder028 (new body)
    with BuildSketch(Plane(origin=(40, 40, 95), x_dir=(1, 0, 0), z_dir=(0, 0, 1))):
        Circle(CYLINDER028_R)
    extrude(amount=CYLINDER028_DEPTH)


with BuildPart() as cilindro027:
    # Cylinder027 → Cylinder027 (new body)
    with BuildSketch(Plane(origin=(25.5, 25.5, 95), x_dir=(1, 0, 0), z_dir=(0, 0, 1))):
        Circle(CYLINDER027_R)
    extrude(amount=CYLINDER027_DEPTH)


with BuildPart() as cilindro026:
    # Cylinder026 → Cylinder026 (new body)
    with BuildSketch(Plane(origin=(54.5, 54.5, 95), x_dir=(1, 0, 0), z_dir=(0, 0, 1))):
        Circle(CYLINDER026_R)
    extrude(amount=CYLINDER026_DEPTH)


with BuildPart() as cilindro025:
    # Cylinder025 → Cylinder025 (new body)
    with BuildSketch(Plane(origin=(54.5, 54.5, 116), x_dir=(1, 0, 0), z_dir=(0, 0, 1))):
        Circle(CYLINDER025_R)
    extrude(amount=CYLINDER025_DEPTH)


with BuildPart() as cubo005:
    # Box005 → Box005 (new body)
    with BuildSketch(Plane(origin=(10, 10, 108), x_dir=(1, 0, 0), z_dir=(0, 0, 1))):
        with Locations((30, 30)):
            Rectangle(BOX005_W, BOX005_H)
    extrude(amount=BOX005_DEPTH)


with BuildPart() as cilindro023:
    # Cylinder023 → Cylinder023 (new body)
    with BuildSketch(Plane(origin=(25.5, 25.5, 116), x_dir=(1, 0, 0), z_dir=(0, 0, 1))):
        Circle(CYLINDER023_R)
    extrude(amount=CYLINDER023_DEPTH)


with BuildPart() as cilindro024:
    # Cylinder024 → Cylinder024 (new body)
    with BuildSketch(Plane(origin=(25.5, 25.5, 105), x_dir=(1, 0, 0), z_dir=(0, 0, 1))):
        Circle(CYLINDER024_R)
    extrude(amount=CYLINDER024_DEPTH)


with BuildPart() as cilindro022:
    # Cylinder022 → Cylinder022 (new body)
    with BuildSketch(Plane(origin=(54.5, 54.5, 105), x_dir=(1, 0, 0), z_dir=(0, 0, 1))):
        Circle(CYLINDER022_R)
    extrude(amount=CYLINDER022_DEPTH)


with BuildPart() as cilindro021:
    # Cylinder021 → Cylinder021 (new body)
    with BuildSketch(Plane(origin=(40, 40, 106), x_dir=(1, 0, 0), z_dir=(0, 0, 1))):
        Circle(CYLINDER021_R)
    extrude(amount=CYLINDER021_DEPTH)


with BuildPart() as cubo018:
    # Box018 → Box018 (new body)
    with BuildSketch(Plane(origin=(10, 10, 108), x_dir=(1, 0, 0), z_dir=(0, 0, 1))):
        with Locations((30, 30)):
            Rectangle(BOX018_W, BOX018_H)
    extrude(amount=BOX018_DEPTH)


with BuildPart() as cut026:
    # Box017 → Box017 (new body)
    with BuildSketch(Plane.XY.offset(110)):
        with Locations((40, 40)):
            Rectangle(BOX017_W, BOX017_H)
    extrude(amount=BOX017_DEPTH)

    # Fusion009: union Cubo018
    add(cubo018.part)

    # Cut016: cut Cilindro021
    add(cilindro021.part, mode=Mode.SUBTRACT)

    # Cut014: cut Cilindro022
    add(cilindro022.part, mode=Mode.SUBTRACT)

    # Cut013: cut Cilindro024
    add(cilindro024.part, mode=Mode.SUBTRACT)

    # Cut017: cut Cilindro023
    add(cilindro023.part, mode=Mode.SUBTRACT)

    # Fusion010: union Cubo005
    add(cubo005.part)

    # Cut020: cut Cilindro025
    add(cilindro025.part, mode=Mode.SUBTRACT)

    # Cut021: cut Cilindro026
    add(cilindro026.part, mode=Mode.SUBTRACT)

    # Cut022: cut Cilindro027
    add(cilindro027.part, mode=Mode.SUBTRACT)

    # Cut023: cut Cilindro028
    add(cilindro028.part, mode=Mode.SUBTRACT)

    # Fillet006
    fillet006_edges = [cut026.edges().sort_by_distance(p)[0] for p in [
        (0, 0, 115),
    ]]
    fillet(fillet006_edges, radius=FILLET006_R)

    # Fillet007
    fillet007_edges = [cut026.edges().sort_by_distance(p)[0] for p in [
        (80, 0, 115),
    ]]
    fillet(fillet007_edges, radius=FILLET007_R)

    # Fillet008
    fillet008_edges = [cut026.edges().sort_by_distance(p)[0] for p in [
        (80, 80, 115),
    ]]
    fillet(fillet008_edges, radius=FILLET008_R)

    # Fillet009
    fillet009_edges = [cut026.edges().sort_by_distance(p)[0] for p in [
        (0, 80, 115),
    ]]
    fillet(fillet009_edges, radius=FILLET009_R)

    # Cut024: cut Cubo019
    add(cubo019.part, mode=Mode.SUBTRACT)

    # Fusion011: union Cubo020
    add(cubo020.part)

    # Cut025: cut Fusion014
    add(fusion014_1.part, mode=Mode.SUBTRACT)

    # Cut026: cut Cilindro033
    add(cilindro033.part, mode=Mode.SUBTRACT)


solid = Compound([fillet005.part, cut019.part, fillet011.part, cut026.part])
